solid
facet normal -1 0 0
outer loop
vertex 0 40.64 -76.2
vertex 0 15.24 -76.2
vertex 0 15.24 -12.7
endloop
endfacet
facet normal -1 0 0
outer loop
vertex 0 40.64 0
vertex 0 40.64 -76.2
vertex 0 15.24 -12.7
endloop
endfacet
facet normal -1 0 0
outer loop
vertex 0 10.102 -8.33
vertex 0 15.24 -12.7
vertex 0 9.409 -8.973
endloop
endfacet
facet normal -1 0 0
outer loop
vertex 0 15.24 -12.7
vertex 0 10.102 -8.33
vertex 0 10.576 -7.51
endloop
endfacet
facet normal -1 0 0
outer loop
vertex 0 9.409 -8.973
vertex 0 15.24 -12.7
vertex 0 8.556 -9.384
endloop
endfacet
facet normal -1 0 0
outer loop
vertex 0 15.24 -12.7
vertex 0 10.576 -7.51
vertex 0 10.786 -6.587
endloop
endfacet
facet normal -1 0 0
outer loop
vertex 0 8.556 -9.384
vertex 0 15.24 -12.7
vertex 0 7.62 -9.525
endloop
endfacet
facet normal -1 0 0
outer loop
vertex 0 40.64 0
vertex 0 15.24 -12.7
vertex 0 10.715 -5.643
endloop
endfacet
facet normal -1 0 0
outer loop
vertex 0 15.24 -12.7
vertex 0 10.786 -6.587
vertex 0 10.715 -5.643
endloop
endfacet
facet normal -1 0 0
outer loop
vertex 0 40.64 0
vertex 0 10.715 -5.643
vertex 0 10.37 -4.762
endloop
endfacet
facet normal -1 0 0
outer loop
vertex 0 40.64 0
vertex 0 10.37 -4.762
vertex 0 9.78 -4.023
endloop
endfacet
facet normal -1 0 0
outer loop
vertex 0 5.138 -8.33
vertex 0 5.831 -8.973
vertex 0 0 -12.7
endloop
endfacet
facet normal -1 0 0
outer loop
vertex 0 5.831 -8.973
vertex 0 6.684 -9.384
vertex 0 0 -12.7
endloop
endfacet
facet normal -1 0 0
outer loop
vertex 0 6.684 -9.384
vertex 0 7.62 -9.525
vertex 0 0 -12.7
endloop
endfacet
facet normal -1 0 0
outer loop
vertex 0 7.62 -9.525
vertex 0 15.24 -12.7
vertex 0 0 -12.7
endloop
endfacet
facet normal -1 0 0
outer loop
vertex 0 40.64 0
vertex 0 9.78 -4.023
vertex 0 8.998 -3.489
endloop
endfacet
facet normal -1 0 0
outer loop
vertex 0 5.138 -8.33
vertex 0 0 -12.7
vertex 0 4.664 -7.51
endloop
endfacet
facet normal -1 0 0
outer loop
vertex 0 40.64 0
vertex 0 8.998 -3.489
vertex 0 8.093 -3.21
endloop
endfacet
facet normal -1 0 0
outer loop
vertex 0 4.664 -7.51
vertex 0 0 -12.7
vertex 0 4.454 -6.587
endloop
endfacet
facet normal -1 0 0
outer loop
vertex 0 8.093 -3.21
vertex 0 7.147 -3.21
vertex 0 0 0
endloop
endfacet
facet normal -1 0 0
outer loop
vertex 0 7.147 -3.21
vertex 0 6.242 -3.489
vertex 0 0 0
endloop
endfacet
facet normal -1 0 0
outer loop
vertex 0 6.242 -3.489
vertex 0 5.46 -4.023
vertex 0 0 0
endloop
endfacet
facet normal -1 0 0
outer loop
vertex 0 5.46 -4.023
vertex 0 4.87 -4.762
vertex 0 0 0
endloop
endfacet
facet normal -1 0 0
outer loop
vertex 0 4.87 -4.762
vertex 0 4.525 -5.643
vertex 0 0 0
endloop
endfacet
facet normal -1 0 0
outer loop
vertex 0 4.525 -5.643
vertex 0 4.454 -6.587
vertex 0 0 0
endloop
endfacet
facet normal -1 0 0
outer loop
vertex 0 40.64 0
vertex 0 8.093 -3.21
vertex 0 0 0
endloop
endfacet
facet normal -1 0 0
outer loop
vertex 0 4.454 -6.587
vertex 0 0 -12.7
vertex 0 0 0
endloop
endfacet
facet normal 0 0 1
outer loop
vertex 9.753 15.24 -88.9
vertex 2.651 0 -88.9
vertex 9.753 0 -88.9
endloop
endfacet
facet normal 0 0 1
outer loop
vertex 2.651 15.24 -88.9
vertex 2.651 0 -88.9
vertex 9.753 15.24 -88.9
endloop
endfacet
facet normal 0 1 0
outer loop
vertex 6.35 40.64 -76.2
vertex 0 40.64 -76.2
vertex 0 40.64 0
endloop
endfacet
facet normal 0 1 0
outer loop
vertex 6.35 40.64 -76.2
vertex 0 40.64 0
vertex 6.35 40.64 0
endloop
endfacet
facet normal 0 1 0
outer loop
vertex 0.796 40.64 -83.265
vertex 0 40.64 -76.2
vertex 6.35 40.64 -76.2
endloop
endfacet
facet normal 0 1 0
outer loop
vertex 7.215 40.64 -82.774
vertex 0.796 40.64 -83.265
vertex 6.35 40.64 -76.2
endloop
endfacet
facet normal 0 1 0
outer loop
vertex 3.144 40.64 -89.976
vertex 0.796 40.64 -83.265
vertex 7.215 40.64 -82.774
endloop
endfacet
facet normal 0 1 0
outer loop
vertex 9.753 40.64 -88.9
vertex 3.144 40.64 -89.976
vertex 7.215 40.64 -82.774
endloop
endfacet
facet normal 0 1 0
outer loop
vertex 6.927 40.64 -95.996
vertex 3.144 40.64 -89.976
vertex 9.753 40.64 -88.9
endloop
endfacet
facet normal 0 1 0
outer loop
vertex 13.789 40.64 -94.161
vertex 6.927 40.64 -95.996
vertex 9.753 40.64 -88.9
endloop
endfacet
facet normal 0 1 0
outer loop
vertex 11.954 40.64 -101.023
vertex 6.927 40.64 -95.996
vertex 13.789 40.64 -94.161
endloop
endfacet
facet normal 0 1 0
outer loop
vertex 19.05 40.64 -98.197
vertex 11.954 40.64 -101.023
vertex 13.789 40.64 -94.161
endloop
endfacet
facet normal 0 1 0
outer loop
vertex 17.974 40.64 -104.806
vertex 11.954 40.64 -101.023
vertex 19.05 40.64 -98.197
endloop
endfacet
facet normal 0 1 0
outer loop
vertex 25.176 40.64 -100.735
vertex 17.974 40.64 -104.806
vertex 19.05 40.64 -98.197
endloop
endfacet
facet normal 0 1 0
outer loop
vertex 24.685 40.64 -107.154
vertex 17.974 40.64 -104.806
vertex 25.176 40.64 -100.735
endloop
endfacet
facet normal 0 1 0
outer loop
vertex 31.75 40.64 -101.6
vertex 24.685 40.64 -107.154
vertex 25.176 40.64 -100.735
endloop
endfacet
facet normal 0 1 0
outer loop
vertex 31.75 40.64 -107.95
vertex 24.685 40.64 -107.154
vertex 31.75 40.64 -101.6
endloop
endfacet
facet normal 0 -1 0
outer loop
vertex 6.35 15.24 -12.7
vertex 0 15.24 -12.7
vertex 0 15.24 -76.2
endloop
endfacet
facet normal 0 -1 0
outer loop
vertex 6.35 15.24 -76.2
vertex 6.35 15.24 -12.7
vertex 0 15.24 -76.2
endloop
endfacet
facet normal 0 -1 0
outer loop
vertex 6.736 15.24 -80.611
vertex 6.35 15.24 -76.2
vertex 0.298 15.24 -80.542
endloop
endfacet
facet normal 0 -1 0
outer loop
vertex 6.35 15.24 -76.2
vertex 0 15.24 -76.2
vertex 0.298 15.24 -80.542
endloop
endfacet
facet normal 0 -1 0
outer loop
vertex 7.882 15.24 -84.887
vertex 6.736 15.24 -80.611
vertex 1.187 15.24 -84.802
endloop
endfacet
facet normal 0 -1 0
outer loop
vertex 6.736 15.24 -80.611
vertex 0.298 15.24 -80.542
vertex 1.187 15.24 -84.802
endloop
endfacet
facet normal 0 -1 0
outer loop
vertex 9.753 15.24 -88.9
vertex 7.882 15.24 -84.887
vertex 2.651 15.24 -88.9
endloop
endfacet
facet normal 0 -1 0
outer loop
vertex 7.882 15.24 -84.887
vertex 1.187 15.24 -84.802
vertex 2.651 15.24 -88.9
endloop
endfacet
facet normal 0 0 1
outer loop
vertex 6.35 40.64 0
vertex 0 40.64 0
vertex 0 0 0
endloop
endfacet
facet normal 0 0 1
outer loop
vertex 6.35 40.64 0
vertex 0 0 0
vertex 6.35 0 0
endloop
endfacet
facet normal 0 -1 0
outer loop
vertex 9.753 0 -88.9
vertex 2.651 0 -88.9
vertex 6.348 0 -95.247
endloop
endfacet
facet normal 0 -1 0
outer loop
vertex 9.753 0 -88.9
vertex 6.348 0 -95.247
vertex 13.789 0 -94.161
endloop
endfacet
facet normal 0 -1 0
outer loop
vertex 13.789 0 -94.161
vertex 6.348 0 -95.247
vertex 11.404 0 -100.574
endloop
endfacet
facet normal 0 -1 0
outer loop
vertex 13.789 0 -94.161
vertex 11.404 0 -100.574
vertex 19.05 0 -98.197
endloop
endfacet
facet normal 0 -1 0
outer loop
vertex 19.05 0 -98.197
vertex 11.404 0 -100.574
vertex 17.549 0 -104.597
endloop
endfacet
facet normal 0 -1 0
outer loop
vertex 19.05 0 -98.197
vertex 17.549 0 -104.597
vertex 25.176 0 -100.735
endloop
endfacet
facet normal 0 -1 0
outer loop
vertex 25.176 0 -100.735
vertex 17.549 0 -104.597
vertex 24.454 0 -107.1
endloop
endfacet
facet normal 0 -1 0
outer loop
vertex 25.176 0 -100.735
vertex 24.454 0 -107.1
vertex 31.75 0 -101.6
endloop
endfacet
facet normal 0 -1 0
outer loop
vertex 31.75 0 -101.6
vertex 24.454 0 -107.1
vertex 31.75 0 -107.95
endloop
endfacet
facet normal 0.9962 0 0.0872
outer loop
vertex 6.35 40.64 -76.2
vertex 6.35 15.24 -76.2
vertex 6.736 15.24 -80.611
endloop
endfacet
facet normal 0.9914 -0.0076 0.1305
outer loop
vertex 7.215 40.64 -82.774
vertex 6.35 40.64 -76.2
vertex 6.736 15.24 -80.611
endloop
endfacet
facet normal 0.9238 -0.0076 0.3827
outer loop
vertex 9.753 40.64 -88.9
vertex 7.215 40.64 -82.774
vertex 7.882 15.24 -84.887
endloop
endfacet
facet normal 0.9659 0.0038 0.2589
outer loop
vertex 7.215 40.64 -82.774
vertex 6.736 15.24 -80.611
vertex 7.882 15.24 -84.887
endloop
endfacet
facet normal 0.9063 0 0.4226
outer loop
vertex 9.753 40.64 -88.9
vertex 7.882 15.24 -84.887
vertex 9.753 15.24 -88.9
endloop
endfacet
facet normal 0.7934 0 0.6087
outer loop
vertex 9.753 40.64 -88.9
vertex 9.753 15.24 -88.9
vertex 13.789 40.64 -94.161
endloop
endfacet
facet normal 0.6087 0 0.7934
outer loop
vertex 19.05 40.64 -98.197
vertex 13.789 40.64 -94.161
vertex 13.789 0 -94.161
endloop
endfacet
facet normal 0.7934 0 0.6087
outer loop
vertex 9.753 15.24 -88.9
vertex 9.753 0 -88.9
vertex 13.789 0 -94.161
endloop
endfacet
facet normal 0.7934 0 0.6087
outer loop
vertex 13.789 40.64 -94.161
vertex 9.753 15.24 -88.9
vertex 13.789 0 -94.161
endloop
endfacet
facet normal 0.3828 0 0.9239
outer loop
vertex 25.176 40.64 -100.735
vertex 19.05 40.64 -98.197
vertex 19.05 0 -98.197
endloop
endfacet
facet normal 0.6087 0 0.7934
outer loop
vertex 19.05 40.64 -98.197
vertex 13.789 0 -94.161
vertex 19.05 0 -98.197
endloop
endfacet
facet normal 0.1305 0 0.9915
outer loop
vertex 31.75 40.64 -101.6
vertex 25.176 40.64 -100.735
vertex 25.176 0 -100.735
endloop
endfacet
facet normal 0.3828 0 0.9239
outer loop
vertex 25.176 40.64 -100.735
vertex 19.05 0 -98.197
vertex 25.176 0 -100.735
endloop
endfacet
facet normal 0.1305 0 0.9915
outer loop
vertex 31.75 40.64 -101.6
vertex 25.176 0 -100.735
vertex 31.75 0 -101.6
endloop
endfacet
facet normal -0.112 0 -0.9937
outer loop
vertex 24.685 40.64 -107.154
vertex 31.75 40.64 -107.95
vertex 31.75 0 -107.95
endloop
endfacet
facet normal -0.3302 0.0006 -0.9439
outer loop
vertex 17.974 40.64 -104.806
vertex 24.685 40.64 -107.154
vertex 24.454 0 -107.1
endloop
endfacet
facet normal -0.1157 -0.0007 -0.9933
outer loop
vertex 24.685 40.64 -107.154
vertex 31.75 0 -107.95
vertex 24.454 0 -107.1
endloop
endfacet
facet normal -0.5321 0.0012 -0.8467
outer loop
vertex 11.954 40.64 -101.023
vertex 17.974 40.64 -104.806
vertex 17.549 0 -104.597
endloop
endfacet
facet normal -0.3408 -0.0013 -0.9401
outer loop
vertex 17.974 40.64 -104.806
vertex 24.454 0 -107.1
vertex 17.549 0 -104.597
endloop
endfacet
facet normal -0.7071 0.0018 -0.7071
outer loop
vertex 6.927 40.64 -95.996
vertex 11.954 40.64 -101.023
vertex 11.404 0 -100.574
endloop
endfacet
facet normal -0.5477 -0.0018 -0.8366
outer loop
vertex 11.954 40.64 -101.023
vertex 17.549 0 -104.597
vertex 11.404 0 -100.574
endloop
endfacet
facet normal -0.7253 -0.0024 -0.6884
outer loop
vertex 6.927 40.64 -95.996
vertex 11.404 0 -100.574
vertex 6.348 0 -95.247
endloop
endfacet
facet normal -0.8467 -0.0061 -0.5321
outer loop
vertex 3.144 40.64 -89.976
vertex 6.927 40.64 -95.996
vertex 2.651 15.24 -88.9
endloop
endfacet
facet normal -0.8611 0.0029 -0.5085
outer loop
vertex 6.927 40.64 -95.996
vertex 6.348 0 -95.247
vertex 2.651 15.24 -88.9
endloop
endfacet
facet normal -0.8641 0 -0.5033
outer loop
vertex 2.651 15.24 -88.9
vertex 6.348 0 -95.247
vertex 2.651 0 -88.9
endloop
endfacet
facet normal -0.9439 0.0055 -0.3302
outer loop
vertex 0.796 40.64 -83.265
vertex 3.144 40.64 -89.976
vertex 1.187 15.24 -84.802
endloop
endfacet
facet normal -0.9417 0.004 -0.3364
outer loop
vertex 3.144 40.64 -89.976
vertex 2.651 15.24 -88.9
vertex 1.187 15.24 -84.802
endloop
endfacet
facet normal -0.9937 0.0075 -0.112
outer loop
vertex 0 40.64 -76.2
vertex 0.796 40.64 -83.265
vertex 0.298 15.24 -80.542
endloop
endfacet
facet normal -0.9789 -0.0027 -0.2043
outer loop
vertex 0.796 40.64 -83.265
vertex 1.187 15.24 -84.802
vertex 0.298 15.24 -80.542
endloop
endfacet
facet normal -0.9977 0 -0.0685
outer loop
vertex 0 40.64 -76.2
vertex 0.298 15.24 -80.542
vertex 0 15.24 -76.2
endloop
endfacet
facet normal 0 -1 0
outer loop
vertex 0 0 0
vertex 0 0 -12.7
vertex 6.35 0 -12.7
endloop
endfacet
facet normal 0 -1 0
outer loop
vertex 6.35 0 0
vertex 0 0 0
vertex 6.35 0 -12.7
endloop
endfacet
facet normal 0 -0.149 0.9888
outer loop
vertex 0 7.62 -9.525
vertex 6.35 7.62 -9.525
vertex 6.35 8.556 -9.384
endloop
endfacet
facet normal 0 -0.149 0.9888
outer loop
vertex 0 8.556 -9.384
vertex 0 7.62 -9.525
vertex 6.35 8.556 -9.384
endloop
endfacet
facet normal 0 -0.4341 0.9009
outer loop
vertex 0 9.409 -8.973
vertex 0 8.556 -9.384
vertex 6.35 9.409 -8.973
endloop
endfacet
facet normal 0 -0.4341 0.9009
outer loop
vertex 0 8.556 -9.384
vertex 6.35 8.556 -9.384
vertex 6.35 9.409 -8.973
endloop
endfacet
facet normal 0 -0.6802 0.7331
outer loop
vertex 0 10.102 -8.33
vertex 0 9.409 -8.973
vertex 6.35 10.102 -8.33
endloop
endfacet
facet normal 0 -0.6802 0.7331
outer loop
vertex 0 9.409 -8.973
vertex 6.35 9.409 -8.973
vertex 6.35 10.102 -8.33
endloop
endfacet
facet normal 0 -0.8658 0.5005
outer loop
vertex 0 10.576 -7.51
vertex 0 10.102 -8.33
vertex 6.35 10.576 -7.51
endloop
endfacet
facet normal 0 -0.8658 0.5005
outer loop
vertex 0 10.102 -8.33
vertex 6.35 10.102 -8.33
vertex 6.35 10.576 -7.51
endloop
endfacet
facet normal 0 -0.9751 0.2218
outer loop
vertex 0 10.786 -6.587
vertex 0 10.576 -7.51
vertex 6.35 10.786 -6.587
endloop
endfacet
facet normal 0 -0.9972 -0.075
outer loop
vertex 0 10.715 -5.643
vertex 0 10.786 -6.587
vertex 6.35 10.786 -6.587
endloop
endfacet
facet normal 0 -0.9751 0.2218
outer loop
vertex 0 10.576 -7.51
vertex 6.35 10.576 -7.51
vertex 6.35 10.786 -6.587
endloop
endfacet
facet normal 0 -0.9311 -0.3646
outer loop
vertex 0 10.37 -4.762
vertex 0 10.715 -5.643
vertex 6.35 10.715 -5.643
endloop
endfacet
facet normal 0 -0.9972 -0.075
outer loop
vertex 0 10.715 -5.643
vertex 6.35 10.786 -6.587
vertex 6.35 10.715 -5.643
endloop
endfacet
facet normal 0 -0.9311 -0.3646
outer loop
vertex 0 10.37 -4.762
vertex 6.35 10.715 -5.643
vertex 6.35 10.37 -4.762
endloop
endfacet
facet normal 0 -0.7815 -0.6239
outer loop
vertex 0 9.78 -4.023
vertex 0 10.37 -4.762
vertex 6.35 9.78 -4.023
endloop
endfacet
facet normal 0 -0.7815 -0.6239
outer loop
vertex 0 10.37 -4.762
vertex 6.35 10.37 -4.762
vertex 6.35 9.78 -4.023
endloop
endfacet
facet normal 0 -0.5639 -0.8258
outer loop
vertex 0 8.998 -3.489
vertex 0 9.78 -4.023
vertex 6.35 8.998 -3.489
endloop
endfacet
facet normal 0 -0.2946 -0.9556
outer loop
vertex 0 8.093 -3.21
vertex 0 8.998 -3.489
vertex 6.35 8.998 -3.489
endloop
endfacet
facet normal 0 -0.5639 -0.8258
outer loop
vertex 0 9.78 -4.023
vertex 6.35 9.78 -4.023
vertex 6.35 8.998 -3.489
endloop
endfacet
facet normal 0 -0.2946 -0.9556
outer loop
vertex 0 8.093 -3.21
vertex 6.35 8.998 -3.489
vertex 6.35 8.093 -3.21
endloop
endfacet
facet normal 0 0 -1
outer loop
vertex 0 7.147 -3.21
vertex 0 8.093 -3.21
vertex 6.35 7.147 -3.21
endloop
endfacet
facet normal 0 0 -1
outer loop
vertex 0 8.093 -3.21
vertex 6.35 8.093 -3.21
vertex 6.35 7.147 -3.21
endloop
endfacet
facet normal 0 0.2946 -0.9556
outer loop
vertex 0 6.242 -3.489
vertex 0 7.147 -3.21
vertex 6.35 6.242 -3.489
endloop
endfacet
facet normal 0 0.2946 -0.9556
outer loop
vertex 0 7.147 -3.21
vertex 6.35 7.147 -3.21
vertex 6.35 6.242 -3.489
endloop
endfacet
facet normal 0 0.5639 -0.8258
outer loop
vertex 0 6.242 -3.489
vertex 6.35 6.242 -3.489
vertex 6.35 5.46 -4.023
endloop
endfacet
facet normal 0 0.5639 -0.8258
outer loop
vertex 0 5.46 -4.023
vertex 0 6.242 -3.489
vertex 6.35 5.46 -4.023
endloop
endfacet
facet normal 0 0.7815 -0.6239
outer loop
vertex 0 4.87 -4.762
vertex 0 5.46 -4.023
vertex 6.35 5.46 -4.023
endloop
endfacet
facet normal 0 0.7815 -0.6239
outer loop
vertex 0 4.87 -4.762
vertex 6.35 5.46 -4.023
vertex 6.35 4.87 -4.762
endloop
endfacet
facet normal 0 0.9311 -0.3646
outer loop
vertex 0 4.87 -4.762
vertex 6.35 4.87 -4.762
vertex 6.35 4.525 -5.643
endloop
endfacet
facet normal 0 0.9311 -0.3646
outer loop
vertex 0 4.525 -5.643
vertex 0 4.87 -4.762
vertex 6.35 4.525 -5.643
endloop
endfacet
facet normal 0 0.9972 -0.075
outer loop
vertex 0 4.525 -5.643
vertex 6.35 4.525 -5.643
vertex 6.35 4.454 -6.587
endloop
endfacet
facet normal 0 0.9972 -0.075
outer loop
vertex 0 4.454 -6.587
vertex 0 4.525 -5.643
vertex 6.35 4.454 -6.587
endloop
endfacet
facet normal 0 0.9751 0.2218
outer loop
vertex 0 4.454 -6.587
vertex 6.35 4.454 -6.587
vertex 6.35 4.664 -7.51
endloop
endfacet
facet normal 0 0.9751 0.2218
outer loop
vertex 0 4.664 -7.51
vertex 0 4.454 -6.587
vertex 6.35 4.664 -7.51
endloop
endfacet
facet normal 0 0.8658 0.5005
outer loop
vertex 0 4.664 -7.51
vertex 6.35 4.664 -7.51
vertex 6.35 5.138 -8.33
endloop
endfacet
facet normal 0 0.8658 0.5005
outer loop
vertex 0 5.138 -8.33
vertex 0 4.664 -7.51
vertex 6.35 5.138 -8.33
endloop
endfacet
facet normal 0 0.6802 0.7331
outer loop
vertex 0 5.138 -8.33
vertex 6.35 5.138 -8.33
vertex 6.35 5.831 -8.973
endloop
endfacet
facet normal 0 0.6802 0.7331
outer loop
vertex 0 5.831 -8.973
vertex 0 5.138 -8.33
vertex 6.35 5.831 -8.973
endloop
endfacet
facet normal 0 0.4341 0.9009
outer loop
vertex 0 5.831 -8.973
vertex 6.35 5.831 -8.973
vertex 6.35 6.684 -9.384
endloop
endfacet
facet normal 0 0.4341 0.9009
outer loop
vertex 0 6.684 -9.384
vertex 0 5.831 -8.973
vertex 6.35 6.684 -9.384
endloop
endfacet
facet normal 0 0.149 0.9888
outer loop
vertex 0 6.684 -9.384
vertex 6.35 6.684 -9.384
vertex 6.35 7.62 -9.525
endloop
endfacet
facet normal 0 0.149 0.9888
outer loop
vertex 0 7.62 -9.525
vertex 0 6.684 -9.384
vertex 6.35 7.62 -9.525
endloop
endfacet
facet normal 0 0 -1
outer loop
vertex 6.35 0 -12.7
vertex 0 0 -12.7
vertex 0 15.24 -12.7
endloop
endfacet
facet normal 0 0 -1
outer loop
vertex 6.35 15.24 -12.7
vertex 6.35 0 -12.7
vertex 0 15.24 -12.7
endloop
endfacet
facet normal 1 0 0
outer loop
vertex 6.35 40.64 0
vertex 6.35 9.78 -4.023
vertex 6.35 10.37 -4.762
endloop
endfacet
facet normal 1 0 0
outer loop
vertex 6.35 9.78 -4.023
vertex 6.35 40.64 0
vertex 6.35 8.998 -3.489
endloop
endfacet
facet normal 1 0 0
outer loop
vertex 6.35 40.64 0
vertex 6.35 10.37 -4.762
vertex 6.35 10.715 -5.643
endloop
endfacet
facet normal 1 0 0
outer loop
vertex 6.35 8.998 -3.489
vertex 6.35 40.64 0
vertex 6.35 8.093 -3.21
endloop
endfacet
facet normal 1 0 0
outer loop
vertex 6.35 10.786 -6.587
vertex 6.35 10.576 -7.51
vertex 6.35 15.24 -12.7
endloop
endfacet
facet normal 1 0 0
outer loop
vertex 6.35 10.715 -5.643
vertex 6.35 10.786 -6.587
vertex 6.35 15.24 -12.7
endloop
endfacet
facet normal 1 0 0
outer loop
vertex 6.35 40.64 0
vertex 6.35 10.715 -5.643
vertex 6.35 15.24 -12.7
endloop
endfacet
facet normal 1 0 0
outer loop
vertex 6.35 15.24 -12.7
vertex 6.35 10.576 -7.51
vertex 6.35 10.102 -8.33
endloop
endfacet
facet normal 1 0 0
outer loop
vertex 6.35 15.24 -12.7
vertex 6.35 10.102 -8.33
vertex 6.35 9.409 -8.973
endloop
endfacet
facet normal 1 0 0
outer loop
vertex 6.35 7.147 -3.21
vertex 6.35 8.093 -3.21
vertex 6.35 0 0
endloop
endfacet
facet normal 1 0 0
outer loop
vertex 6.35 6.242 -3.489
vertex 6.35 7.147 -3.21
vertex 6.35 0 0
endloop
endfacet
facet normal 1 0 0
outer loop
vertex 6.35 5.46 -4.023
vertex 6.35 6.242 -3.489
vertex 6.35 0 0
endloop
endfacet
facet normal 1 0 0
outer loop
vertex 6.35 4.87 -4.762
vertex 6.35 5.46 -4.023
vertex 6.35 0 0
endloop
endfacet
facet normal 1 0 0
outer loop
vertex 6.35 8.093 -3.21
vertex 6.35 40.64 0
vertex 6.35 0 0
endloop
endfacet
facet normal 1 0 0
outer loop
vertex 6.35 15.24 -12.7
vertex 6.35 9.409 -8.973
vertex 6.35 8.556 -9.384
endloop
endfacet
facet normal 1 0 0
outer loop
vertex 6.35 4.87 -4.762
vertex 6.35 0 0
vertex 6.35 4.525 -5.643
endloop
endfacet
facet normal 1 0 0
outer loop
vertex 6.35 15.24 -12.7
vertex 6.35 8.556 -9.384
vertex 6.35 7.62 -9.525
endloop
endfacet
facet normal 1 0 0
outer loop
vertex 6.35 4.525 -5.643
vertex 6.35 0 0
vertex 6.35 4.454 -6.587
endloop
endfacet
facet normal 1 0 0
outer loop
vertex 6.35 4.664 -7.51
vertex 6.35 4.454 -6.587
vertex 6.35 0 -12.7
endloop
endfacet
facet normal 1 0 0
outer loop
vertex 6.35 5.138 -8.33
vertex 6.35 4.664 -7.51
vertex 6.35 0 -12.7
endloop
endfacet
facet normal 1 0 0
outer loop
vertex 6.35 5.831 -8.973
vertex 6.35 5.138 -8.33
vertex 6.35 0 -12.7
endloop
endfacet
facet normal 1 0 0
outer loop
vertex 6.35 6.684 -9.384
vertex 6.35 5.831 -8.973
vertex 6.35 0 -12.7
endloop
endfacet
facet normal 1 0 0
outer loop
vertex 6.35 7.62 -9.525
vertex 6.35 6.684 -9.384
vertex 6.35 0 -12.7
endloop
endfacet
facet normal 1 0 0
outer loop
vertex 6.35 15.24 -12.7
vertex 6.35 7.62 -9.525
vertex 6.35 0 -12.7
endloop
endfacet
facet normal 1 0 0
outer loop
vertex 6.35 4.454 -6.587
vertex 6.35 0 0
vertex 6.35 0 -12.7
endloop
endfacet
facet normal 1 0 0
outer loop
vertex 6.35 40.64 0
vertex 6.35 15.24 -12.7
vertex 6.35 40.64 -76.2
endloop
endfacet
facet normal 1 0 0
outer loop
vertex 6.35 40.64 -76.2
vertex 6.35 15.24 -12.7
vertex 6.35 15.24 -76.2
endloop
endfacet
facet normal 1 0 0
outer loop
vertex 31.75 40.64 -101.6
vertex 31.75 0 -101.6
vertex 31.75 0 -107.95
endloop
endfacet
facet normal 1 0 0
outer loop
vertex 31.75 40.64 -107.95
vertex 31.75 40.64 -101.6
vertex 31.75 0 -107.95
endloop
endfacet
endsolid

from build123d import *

# Parameters (mm, degrees)
BOSS_EXTRUDE1_DEPTH = 40.64
SKETCH2_R           = 3.175
CUT_EXTRUDE1_DEPTH  = 40.64
SKETCH3_W           = 76.2
SKETCH3_H           = 15.24
CUT_EXTRUDE2_DEPTH  = 40.64


with BuildPart() as part:
    # Sketch1 → Boss-Extrude1 (new body)
    with BuildSketch(Plane(origin=(0, 0, 0), x_dir=(1, 0, 0), z_dir=(0, 1, 0))):
        with BuildLine():
            Line((31.75, 101.6), (31.75, 107.95))
            ThreePointArc((31.75, 107.95), (9.299359697, 98.650640303), (0, 76.2))
            Line((0, 76.2), (0, 0))
            Line((0, 0), (6.35, 0))
            Line((6.35, 0), (6.35, 76.2))
            ThreePointArc((6.35, 76.2), (13.789487758, 94.160512242), (31.75, 101.6))
        make_face()
    extrude(amount=BOSS_EXTRUDE1_DEPTH)

    # Sketch2 → Cut-Extrude1 (cut)
    with BuildSketch(Plane(origin=(6.35, 0, 0), x_dir=(0, 0, -1), z_dir=(1, 0, 0))):
        with Locations((6.35, 7.62)):
            Circle(SKETCH2_R)
    extrude(amount=-CUT_EXTRUDE1_DEPTH, mode=Mode.SUBTRACT)

    # Sketch3 → Cut-Extrude2 (cut)
    with BuildSketch(Plane(origin=(0, 0, 0), x_dir=(0, 0, -1), z_dir=(1, 0, 0))):
        with Locations((50.8, 7.62)):
            Rectangle(SKETCH3_W, SKETCH3_H)
    extrude(amount=CUT_EXTRUDE2_DEPTH, mode=Mode.SUBTRACT)


solid = part.part
